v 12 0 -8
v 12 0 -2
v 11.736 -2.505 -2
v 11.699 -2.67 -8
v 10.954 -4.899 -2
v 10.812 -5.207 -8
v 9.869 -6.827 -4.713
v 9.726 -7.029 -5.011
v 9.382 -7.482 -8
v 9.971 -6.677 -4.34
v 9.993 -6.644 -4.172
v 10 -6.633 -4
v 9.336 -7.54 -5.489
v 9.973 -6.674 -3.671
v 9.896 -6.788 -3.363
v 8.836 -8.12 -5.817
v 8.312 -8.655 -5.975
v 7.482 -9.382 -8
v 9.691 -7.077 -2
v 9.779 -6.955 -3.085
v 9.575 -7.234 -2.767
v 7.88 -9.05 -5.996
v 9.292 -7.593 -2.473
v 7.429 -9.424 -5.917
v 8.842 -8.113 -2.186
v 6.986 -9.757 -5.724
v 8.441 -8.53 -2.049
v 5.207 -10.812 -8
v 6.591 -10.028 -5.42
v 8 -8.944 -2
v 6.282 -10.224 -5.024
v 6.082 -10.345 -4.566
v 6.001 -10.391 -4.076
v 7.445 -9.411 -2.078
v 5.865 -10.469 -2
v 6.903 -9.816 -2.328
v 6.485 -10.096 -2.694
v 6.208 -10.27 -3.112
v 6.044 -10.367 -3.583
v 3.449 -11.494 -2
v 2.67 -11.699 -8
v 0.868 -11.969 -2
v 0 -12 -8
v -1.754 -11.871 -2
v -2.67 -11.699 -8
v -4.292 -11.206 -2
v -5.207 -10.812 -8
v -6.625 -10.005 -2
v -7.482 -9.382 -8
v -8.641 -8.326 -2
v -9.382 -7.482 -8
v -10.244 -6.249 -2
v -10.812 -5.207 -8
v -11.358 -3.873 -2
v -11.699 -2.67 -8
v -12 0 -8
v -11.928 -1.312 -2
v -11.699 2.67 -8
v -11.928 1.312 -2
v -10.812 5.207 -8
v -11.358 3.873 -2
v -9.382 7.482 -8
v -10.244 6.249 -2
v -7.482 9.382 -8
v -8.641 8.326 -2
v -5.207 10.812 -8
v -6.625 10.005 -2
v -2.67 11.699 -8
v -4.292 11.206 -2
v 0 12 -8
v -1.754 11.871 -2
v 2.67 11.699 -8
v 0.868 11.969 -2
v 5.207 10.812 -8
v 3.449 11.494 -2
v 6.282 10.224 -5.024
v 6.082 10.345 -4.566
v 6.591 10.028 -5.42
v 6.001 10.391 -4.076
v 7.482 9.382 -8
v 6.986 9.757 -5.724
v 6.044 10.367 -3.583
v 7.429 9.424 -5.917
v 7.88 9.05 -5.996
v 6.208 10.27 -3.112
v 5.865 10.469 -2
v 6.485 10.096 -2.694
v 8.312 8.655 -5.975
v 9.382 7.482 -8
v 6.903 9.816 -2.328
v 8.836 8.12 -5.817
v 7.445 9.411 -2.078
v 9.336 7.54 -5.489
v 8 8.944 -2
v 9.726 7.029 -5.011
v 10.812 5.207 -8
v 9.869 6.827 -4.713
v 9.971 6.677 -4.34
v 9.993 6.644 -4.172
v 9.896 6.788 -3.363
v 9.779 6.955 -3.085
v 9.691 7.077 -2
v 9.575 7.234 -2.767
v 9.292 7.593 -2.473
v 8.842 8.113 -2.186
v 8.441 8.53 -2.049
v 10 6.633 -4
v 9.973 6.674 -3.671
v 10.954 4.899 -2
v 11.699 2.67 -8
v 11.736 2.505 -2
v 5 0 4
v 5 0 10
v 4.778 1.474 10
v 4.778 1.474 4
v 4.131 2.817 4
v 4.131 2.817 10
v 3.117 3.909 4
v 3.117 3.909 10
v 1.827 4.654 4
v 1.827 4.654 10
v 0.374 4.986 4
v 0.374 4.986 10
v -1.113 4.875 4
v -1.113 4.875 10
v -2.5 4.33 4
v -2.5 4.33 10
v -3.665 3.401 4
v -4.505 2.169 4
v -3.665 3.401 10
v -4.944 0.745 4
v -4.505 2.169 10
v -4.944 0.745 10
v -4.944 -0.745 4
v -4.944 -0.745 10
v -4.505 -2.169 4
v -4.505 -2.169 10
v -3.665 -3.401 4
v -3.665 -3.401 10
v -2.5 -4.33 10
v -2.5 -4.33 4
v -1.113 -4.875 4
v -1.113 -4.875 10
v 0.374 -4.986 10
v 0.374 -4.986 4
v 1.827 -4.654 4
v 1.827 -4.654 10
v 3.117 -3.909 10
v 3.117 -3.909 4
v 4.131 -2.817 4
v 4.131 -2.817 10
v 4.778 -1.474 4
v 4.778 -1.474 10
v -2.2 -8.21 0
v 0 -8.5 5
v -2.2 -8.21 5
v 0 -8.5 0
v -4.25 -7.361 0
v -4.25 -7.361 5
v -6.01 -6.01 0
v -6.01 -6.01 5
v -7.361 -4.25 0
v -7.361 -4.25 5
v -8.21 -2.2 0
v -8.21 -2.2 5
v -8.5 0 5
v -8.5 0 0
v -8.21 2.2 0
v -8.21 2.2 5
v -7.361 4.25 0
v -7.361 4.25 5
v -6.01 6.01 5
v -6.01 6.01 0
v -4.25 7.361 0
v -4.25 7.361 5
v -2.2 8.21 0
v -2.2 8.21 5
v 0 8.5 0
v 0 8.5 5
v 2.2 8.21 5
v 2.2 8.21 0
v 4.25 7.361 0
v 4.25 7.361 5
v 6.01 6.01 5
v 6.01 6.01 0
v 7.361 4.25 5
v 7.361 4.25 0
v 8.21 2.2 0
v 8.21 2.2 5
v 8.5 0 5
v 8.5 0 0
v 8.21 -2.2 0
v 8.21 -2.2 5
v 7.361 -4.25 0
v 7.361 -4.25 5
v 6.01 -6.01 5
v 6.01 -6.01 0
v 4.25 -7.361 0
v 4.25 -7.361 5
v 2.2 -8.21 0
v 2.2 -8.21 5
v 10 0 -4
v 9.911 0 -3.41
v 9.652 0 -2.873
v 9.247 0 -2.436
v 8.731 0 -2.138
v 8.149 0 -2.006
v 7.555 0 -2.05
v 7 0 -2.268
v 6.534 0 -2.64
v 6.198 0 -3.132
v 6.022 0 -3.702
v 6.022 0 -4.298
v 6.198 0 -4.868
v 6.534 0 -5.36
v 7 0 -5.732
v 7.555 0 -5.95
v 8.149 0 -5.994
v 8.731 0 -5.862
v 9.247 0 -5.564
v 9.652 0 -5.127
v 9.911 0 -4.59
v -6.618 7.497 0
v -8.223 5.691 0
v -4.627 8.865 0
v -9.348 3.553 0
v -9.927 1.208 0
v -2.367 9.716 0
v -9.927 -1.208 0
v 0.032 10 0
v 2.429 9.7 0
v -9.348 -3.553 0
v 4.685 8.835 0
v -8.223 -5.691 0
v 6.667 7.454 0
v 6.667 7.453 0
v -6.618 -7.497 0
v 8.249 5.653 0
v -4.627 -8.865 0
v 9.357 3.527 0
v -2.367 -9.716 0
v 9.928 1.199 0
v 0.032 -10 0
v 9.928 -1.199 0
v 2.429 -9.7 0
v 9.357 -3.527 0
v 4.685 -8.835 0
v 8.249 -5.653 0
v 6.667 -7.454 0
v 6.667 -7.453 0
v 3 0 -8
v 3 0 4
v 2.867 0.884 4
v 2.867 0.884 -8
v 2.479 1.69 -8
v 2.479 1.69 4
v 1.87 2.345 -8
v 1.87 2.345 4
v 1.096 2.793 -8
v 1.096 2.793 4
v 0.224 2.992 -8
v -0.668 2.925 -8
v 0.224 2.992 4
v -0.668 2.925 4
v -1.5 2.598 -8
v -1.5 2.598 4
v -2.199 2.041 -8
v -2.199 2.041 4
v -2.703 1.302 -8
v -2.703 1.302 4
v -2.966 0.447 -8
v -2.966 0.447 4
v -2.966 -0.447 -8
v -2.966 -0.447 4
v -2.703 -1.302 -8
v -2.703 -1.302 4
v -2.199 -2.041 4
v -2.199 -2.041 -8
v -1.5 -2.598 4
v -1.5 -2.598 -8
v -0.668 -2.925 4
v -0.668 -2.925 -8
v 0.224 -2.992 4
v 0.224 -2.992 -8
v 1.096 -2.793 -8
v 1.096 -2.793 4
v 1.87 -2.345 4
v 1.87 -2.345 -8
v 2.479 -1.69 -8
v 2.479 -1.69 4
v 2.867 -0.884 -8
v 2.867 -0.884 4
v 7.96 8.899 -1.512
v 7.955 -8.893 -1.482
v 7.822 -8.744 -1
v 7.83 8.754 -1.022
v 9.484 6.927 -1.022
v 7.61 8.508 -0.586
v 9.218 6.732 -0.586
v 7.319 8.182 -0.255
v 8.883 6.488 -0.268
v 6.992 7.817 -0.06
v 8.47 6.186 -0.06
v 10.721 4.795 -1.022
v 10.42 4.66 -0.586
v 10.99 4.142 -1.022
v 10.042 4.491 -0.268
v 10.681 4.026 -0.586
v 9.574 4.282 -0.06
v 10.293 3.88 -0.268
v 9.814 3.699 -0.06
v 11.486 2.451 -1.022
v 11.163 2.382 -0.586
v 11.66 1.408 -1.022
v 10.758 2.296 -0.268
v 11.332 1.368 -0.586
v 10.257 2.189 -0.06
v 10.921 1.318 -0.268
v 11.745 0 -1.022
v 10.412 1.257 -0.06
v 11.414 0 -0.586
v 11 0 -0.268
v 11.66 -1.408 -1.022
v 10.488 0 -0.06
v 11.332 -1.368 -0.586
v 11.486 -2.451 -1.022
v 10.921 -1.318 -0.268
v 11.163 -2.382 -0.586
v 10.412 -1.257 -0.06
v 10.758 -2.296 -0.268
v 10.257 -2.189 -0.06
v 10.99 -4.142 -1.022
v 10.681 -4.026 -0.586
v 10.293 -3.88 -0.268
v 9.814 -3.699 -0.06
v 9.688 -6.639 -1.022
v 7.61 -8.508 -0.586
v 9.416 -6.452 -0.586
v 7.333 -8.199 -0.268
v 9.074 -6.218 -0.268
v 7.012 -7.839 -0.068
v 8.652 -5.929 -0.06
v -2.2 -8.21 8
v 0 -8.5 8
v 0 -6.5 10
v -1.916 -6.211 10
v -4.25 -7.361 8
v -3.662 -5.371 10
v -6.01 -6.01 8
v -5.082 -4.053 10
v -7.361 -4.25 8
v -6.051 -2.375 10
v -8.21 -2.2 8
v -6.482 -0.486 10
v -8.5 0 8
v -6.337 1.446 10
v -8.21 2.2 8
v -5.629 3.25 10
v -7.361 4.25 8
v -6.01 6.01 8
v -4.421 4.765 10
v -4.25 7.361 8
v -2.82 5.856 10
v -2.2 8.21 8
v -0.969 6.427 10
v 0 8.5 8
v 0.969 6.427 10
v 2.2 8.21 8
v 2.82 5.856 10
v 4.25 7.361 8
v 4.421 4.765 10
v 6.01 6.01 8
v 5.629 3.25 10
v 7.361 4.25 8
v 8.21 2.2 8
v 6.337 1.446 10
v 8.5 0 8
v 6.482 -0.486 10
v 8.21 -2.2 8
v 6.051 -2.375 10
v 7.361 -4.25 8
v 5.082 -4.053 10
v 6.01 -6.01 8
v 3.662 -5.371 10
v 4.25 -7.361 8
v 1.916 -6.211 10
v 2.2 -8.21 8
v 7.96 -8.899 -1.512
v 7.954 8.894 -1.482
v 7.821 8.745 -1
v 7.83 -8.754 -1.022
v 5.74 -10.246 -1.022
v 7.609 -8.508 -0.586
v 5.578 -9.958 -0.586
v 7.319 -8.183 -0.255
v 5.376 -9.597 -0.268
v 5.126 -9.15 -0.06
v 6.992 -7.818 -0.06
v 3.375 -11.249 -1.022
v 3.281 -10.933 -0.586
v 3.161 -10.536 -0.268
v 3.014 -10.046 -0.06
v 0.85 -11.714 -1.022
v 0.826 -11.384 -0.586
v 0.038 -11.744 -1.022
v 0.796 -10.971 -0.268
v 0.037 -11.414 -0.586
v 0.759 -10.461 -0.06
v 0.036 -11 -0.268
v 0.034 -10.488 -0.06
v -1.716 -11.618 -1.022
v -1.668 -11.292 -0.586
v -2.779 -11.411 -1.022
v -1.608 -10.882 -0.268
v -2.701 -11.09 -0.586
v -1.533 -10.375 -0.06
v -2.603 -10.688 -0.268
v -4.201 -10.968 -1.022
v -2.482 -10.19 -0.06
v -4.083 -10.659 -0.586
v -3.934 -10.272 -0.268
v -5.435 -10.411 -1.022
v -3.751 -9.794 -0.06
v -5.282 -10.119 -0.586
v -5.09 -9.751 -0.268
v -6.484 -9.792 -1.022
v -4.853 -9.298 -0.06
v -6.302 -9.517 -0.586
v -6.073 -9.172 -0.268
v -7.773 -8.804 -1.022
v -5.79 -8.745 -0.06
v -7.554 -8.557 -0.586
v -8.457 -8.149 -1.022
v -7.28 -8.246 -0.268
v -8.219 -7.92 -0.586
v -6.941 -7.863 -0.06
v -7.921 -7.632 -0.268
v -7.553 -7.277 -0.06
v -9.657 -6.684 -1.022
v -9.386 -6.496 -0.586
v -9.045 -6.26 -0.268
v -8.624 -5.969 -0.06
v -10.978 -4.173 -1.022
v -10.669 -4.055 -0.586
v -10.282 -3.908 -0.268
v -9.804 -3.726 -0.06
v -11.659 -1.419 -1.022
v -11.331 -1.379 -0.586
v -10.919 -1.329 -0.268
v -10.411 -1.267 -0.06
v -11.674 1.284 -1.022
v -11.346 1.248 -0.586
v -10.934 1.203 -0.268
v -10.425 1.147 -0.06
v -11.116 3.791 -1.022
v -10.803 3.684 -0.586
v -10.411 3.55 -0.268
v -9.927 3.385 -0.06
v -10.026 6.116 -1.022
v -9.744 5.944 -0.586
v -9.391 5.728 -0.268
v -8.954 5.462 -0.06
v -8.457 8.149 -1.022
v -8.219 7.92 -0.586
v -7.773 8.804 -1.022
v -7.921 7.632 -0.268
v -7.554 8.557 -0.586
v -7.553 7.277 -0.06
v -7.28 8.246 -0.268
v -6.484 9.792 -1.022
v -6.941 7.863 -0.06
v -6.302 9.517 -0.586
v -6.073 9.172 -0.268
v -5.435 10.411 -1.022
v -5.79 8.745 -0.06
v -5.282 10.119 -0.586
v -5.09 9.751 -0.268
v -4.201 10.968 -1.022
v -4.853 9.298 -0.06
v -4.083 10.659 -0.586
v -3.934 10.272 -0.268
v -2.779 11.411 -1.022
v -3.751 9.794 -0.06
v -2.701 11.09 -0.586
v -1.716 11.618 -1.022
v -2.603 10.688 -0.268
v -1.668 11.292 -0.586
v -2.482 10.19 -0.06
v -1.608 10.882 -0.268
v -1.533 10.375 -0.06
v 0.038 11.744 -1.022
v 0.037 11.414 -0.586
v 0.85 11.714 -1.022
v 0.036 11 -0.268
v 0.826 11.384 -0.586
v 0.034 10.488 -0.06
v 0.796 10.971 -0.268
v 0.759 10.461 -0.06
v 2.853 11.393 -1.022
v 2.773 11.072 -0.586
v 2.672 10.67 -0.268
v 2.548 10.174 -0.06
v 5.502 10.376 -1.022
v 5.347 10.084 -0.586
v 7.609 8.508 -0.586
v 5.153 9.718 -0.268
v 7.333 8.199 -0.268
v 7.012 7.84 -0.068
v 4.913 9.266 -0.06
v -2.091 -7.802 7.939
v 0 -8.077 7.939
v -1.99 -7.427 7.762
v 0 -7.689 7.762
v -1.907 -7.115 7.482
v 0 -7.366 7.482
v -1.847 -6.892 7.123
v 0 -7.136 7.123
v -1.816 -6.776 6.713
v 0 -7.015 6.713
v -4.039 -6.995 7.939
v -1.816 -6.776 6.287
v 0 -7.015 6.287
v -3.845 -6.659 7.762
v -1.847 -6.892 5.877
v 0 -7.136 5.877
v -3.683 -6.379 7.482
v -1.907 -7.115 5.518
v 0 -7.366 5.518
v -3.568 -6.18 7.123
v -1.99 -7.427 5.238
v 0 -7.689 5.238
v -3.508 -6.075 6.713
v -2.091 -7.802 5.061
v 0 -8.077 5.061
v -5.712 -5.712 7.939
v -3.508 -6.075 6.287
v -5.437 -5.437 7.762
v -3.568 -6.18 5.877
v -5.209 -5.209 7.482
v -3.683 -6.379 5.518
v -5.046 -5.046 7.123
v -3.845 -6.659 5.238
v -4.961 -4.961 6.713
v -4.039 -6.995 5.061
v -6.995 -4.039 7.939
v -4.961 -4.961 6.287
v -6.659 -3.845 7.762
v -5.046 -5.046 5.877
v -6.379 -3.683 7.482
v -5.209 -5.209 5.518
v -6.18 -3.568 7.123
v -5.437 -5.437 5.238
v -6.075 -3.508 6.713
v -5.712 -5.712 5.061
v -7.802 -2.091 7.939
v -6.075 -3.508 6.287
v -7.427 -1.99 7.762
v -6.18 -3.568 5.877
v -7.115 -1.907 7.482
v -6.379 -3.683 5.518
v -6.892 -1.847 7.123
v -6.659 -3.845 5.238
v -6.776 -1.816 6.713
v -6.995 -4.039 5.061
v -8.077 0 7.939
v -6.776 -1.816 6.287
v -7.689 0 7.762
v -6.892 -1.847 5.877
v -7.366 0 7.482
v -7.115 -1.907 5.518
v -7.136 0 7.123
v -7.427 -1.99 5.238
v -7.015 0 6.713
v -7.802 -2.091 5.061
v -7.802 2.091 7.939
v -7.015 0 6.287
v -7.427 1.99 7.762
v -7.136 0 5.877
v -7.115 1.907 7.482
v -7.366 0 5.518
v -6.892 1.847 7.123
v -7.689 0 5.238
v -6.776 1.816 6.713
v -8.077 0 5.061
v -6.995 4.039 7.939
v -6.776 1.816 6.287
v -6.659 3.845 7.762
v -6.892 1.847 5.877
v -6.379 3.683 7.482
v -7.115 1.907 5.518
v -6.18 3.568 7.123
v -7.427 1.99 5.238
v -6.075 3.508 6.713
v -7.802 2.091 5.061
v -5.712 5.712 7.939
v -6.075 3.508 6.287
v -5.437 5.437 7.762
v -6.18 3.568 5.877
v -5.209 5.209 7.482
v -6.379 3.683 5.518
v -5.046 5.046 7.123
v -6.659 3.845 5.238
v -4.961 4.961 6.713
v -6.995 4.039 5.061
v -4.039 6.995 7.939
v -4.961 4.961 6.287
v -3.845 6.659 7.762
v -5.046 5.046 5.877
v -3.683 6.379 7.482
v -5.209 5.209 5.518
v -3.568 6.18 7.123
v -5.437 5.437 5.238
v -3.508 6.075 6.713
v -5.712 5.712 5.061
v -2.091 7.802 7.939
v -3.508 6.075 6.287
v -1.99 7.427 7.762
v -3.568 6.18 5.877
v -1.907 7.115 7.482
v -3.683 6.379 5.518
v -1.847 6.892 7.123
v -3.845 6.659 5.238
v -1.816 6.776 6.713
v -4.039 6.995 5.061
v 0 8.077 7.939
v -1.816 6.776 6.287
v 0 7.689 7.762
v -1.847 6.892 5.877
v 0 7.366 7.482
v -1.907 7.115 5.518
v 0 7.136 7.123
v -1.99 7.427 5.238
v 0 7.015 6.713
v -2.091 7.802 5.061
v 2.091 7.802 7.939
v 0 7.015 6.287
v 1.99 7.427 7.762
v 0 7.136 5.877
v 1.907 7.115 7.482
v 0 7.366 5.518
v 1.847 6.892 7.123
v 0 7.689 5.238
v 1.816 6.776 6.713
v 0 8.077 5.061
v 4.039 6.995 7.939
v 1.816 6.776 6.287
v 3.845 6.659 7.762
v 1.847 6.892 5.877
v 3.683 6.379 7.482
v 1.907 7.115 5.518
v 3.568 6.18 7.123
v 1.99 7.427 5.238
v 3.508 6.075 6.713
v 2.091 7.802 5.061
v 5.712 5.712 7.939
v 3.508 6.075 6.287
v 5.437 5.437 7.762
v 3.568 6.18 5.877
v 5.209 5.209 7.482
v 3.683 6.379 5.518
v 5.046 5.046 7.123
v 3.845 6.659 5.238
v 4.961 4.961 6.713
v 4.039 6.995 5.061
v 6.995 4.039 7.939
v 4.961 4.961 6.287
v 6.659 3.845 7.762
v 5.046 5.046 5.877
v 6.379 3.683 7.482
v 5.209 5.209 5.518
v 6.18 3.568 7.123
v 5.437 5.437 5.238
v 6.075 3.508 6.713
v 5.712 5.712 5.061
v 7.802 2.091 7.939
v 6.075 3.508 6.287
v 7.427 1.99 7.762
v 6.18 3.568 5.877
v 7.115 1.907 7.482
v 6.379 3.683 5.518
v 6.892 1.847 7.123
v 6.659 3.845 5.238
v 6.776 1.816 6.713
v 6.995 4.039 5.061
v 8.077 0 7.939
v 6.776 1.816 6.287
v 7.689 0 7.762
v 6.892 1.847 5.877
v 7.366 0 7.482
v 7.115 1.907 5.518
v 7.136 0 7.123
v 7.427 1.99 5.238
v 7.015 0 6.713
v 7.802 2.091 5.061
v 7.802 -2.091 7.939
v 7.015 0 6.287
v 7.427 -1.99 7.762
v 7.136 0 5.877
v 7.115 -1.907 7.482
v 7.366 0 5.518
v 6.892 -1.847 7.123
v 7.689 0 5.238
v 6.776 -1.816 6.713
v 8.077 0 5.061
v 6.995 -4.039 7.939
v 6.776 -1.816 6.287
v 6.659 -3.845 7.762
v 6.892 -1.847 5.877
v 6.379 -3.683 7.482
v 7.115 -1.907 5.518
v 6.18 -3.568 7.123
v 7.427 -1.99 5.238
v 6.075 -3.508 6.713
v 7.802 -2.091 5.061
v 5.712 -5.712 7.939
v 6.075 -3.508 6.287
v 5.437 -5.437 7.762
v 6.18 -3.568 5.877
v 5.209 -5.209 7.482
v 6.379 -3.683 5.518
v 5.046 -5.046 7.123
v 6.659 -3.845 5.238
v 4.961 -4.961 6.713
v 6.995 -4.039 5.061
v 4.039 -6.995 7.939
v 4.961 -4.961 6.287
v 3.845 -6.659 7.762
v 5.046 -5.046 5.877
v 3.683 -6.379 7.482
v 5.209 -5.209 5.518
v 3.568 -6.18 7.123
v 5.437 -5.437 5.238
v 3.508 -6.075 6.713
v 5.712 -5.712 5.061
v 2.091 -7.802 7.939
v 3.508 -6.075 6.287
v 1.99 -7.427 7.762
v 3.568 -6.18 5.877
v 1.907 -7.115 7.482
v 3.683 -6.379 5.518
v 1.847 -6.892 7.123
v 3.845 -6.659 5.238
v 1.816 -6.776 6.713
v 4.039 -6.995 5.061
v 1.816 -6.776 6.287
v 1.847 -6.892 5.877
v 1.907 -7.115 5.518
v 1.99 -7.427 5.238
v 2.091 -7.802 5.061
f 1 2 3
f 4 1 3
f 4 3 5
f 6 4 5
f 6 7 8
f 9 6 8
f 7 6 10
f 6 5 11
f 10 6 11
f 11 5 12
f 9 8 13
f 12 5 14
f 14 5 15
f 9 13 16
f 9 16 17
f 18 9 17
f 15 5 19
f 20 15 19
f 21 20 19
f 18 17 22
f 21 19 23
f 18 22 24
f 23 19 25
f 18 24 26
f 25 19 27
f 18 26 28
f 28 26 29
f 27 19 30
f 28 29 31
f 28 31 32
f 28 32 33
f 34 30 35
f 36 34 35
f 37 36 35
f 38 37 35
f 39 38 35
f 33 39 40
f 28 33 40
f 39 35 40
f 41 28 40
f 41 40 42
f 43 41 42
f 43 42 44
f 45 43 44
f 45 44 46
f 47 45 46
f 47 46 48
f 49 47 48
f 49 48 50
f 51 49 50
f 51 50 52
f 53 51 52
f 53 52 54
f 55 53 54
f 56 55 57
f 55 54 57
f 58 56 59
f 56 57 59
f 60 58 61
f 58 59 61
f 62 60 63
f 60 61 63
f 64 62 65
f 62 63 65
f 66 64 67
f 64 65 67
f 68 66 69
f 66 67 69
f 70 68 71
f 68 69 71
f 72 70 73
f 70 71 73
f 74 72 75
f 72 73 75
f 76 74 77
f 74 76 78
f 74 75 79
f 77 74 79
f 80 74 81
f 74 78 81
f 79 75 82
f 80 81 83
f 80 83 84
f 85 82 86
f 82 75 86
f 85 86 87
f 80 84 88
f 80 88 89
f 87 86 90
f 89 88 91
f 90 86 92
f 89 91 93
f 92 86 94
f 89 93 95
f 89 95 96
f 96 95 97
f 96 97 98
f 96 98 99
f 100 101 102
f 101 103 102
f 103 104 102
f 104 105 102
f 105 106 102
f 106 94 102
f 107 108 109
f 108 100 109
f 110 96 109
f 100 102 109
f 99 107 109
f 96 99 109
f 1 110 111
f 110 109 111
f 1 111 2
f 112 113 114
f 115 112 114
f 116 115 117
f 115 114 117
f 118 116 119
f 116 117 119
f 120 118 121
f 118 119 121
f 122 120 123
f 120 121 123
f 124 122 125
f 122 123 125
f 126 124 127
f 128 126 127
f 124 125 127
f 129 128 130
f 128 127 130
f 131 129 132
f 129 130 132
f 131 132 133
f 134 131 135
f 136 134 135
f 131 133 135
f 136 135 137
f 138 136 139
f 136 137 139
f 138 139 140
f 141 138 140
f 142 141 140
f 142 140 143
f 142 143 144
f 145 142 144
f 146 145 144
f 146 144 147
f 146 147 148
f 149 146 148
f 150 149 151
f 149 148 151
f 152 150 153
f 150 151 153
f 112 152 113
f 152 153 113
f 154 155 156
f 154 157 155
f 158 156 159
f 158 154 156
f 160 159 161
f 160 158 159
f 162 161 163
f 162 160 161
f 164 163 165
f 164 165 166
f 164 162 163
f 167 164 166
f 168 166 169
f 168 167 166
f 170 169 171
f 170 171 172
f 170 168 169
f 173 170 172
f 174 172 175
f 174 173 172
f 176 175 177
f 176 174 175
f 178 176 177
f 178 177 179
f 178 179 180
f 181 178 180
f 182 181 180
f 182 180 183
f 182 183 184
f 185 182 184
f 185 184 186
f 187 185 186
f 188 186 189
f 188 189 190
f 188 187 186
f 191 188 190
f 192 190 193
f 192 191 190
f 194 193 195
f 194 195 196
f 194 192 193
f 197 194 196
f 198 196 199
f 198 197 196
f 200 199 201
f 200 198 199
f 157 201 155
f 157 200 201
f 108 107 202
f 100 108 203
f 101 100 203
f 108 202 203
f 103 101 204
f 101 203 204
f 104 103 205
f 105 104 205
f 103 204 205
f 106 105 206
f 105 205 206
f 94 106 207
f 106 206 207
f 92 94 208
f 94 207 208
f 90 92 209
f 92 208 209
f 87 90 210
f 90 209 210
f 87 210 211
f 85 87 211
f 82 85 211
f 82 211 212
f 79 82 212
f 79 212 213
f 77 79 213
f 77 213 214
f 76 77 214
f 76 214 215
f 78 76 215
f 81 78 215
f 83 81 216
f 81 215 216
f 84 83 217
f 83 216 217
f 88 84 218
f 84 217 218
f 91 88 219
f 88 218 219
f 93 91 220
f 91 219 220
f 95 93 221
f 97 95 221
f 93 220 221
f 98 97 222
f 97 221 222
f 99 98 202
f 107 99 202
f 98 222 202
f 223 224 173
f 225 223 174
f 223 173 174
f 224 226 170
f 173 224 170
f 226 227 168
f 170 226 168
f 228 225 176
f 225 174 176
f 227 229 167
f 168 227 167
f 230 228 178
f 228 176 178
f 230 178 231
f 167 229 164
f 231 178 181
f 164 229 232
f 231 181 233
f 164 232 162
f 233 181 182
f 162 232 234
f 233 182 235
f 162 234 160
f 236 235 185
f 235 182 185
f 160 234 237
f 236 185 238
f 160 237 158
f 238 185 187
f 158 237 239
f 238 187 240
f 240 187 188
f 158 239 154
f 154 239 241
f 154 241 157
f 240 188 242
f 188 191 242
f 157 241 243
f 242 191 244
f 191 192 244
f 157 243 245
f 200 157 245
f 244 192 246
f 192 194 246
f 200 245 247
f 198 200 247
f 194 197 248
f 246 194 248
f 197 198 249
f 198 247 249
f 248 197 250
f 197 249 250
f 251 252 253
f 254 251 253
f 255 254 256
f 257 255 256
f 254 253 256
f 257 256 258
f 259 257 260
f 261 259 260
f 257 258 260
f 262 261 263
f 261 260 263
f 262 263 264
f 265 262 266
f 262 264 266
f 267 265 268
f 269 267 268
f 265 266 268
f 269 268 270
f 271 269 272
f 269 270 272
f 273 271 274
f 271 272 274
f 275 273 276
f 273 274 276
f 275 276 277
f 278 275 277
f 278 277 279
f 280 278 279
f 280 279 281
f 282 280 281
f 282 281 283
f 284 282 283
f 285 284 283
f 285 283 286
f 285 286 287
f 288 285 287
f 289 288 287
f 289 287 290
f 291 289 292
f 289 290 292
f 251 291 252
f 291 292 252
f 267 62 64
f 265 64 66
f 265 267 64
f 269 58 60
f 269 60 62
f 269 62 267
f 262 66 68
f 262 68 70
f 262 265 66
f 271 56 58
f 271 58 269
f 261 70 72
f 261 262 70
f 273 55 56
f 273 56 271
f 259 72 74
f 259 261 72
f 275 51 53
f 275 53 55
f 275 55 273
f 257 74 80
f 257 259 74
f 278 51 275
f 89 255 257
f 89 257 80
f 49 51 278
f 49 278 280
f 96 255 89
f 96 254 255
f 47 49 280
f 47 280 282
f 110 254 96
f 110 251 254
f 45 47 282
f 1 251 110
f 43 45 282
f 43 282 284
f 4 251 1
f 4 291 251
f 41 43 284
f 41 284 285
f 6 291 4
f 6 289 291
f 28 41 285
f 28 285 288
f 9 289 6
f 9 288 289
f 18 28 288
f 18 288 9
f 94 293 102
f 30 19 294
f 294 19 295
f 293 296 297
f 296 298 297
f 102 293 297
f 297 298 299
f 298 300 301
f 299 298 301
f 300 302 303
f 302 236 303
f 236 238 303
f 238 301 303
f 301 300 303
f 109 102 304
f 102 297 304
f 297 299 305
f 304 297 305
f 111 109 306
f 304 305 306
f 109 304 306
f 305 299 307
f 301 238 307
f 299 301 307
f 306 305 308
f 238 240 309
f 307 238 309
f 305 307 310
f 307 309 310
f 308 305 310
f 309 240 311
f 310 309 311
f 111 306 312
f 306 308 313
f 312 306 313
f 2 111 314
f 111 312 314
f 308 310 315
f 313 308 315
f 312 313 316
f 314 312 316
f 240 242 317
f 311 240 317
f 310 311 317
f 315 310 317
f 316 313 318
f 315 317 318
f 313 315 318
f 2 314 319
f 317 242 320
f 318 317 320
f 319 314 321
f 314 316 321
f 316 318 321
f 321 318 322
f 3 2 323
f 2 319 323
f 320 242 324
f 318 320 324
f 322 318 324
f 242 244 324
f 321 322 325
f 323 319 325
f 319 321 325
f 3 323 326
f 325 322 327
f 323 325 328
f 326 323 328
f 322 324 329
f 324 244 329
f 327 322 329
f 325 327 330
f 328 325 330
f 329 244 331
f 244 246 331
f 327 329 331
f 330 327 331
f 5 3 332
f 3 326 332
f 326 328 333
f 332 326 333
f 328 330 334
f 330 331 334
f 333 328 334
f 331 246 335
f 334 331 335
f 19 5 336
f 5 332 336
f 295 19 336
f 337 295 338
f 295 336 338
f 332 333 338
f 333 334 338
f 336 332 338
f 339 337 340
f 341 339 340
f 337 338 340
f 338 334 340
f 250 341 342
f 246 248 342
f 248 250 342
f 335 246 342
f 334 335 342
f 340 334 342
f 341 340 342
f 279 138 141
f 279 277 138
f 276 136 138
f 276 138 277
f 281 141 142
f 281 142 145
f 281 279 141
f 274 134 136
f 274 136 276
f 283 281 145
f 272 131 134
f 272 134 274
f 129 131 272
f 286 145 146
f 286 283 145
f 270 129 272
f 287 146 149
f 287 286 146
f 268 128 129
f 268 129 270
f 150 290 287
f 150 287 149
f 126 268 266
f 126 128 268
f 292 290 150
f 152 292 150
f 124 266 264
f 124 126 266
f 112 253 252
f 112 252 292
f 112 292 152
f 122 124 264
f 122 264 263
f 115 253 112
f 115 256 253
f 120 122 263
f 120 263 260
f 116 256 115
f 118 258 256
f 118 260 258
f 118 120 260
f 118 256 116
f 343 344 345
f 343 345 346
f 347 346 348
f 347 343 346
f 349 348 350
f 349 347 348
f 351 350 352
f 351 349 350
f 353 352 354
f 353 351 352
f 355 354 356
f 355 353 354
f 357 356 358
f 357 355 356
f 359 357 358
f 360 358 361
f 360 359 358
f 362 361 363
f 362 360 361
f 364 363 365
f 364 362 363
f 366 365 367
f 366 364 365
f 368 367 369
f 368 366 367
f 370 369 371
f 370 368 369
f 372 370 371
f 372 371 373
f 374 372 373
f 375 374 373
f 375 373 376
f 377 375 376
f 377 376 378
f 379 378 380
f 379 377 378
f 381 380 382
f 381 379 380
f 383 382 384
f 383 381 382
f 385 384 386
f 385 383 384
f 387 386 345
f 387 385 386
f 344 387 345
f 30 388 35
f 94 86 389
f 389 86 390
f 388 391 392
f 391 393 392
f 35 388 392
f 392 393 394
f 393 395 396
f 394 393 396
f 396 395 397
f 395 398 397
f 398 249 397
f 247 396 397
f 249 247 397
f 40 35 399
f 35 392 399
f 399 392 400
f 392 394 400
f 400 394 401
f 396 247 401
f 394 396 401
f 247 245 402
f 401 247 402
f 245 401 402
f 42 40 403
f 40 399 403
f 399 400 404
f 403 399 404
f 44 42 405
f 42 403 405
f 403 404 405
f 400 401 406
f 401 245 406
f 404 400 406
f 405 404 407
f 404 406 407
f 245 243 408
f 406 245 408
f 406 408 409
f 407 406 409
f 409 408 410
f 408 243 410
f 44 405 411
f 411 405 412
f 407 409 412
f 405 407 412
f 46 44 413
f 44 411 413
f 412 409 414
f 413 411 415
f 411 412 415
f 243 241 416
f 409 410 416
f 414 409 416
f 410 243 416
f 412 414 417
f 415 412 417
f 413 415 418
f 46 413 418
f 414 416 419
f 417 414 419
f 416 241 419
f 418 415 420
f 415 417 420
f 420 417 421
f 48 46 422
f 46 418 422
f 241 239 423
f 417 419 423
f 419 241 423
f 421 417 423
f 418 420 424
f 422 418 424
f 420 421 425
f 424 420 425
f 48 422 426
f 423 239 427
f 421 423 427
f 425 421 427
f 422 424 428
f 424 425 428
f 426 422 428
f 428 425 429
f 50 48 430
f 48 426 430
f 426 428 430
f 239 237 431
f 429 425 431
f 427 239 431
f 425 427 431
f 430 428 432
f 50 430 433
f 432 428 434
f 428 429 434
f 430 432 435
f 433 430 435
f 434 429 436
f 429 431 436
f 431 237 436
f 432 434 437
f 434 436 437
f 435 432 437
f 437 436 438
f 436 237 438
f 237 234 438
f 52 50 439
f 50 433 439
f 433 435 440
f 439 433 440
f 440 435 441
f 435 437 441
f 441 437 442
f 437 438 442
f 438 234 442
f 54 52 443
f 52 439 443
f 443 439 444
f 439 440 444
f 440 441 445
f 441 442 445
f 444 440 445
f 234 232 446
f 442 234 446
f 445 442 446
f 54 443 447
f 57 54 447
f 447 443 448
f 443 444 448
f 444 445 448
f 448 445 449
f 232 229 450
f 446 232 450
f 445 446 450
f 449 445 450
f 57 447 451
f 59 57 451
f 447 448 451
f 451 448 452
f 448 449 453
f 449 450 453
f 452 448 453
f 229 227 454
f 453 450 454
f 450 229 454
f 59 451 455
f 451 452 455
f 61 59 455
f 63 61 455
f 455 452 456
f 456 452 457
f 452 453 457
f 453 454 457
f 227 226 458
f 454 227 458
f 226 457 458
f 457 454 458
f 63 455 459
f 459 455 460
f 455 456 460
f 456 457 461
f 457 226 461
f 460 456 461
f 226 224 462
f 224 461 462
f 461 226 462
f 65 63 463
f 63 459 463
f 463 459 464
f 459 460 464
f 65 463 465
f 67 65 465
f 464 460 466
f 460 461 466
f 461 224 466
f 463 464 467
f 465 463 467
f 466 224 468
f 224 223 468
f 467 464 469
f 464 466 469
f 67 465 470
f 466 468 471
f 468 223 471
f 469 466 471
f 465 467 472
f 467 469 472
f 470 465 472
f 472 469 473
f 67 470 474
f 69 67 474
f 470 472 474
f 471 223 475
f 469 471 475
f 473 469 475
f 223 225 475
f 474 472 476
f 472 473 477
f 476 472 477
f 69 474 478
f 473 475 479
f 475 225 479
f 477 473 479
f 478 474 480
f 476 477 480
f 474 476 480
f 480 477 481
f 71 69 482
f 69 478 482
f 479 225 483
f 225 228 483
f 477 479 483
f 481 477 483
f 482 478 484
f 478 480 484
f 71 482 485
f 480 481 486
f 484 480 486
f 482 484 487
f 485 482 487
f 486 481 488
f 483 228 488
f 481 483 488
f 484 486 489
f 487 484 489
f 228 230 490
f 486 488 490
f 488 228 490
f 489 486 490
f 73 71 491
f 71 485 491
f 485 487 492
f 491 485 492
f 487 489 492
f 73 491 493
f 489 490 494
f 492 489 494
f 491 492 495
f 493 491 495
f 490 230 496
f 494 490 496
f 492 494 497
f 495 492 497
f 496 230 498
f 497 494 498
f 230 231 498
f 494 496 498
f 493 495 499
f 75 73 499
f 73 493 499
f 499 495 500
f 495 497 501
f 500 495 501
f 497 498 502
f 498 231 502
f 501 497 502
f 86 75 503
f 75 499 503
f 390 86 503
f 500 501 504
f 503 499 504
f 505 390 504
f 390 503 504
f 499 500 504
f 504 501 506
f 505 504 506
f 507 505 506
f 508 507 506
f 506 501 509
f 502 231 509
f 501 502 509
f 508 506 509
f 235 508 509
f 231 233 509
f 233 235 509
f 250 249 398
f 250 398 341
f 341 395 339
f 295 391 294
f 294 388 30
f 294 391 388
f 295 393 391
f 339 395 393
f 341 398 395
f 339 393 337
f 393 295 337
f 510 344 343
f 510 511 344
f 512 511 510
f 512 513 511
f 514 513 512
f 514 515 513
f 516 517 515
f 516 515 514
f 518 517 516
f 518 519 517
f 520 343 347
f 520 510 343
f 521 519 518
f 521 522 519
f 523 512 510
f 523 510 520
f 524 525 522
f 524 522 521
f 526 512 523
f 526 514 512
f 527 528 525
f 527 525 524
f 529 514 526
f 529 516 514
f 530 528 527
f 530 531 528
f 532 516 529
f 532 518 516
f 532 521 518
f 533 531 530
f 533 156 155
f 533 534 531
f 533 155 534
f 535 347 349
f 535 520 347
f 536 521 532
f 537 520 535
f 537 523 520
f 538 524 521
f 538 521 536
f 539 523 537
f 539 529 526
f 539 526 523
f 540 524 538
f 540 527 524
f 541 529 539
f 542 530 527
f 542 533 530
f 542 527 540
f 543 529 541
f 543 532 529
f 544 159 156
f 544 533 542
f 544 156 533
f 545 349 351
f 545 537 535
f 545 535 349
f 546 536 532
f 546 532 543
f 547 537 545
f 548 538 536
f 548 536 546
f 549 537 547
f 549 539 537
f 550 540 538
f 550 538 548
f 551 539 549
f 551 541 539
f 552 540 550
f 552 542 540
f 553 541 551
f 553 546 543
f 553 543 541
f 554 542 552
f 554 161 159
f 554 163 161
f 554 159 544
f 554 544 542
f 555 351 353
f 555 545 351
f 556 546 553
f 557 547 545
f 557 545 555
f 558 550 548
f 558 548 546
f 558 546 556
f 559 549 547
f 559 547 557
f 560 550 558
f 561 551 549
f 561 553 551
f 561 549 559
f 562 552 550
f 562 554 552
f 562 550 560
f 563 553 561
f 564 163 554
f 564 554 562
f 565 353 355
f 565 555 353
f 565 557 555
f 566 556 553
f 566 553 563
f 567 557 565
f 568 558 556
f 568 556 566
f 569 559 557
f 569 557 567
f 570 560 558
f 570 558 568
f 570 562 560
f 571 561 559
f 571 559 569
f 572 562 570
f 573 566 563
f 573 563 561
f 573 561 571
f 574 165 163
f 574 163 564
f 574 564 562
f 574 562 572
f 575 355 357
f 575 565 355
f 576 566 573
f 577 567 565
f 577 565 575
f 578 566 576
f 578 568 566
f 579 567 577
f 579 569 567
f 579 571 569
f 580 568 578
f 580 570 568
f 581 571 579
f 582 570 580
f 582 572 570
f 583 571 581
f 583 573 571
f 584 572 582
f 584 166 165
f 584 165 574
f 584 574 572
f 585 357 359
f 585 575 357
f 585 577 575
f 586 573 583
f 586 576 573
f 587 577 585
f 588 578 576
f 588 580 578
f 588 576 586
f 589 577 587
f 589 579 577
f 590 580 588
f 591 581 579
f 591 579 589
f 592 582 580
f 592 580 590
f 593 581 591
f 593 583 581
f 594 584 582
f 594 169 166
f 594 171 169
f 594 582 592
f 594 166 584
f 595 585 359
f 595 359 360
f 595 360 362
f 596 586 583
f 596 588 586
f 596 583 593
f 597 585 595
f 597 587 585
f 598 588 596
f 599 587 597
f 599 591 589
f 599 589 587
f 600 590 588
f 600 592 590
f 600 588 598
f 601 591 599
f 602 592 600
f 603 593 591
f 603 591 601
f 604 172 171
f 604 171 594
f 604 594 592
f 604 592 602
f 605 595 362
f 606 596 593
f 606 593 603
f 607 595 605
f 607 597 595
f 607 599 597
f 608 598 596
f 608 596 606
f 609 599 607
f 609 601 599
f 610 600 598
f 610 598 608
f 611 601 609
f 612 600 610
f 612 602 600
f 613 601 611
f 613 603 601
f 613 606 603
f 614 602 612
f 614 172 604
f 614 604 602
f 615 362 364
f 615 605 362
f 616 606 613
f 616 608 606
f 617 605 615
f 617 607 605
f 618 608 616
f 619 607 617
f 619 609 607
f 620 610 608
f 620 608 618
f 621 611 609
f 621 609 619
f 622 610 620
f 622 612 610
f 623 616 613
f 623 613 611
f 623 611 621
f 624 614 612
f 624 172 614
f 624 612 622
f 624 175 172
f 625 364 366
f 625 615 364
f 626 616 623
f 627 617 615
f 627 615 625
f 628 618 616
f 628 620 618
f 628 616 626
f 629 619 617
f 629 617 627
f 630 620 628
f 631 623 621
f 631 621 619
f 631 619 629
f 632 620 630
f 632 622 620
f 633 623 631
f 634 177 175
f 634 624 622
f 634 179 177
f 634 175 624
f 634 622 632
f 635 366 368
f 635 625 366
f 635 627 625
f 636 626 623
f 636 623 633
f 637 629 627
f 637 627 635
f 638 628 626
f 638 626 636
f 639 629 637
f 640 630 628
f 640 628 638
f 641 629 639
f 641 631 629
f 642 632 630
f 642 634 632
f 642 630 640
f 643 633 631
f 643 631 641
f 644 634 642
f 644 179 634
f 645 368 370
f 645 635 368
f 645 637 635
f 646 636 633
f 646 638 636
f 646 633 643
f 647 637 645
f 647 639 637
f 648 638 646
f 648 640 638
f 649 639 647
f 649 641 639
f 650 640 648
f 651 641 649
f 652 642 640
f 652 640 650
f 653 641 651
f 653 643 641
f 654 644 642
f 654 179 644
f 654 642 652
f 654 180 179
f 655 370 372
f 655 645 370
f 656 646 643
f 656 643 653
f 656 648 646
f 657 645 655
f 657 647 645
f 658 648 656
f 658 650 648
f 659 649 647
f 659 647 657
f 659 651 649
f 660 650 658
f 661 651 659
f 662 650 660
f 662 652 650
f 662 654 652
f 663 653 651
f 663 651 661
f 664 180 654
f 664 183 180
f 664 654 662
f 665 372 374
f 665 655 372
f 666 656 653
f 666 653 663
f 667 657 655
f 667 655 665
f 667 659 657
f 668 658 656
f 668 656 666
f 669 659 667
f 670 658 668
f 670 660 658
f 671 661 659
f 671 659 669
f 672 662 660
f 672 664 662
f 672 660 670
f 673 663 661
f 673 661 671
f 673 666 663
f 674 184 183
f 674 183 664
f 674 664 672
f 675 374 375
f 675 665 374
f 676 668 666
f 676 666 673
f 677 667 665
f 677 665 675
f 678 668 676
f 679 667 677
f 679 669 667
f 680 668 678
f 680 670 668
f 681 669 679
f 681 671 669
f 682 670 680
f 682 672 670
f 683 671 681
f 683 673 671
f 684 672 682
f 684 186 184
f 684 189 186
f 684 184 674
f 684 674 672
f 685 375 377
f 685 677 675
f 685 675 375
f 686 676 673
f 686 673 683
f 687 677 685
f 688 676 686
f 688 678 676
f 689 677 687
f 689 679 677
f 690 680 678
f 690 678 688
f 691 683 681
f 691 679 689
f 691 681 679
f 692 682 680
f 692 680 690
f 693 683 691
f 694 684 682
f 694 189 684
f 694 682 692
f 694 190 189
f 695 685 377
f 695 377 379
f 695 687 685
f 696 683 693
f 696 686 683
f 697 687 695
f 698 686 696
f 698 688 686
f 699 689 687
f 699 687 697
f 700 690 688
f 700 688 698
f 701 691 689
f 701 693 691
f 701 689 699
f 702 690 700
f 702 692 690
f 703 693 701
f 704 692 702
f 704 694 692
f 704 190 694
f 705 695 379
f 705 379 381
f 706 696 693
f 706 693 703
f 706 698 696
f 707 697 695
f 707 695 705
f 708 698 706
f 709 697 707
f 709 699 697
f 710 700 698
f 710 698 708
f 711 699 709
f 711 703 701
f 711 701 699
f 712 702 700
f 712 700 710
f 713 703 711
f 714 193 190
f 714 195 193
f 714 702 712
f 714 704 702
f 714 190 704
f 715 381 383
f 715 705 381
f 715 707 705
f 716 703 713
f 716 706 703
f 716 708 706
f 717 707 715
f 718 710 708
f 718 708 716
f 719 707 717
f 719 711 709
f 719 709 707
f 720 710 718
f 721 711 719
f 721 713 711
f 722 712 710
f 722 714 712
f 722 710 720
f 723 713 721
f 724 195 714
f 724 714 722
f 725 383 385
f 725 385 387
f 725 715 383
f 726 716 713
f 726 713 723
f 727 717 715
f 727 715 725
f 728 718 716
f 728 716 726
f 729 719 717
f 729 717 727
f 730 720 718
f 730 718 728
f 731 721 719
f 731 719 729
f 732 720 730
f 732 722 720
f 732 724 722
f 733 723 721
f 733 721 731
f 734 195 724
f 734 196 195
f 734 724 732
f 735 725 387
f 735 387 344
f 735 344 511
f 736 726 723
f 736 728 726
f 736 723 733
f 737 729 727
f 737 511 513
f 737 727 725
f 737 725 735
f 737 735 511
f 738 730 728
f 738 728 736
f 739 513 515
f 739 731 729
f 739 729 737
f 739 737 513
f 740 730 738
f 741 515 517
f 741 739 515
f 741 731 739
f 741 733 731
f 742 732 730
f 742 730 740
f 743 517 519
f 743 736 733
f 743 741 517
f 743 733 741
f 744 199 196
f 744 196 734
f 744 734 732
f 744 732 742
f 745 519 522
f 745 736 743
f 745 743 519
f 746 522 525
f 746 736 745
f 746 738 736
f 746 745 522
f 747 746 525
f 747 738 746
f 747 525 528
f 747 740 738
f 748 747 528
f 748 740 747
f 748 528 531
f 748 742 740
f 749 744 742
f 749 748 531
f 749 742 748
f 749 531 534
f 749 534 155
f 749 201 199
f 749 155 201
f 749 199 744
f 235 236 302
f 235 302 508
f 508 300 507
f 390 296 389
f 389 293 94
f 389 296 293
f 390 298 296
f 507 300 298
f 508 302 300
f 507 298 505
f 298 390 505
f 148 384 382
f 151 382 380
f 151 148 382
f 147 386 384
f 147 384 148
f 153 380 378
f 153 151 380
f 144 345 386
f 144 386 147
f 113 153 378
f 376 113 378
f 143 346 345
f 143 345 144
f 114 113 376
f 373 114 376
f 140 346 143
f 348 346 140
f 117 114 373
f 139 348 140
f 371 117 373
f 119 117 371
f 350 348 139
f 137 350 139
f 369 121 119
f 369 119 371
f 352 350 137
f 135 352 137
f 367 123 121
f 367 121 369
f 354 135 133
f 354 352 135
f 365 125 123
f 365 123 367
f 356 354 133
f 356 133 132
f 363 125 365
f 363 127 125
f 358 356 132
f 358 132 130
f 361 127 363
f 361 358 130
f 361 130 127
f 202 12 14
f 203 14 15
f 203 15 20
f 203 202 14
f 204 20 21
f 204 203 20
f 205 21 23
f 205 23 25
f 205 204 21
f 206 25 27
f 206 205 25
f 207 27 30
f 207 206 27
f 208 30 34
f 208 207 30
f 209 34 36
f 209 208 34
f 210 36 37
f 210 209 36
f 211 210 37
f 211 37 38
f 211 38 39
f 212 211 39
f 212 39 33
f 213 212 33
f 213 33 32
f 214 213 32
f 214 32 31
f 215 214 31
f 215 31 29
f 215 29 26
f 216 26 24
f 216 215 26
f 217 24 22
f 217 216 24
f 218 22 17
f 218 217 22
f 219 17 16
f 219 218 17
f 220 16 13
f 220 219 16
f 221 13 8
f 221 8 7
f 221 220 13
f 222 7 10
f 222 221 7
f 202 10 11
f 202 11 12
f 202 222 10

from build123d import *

# Parameters (mm, degrees)
F2_SIZE        = 1.99999
F3_R           = 5
F4_DEPTH       = 6
F5_R           = 12
F6_DEPTH       = 8
F7_R           = 3
F8_DEPTH       = 12
F9_R           = 2
F10_DEPTH      = 12.001
F10_DEPTH_BACK = 12.001
F11_R          = 2


# Not quite as in the source:
# - a fillet or chamfer is up to 0.001 mm smaller than in the source, because OpenCascade refuses the exact size


with BuildPart() as f1:
    # F0 (on Right) → F1 (revolve)
    with BuildSketch(Plane.YZ):
        with BuildLine():
            Line((-8.5, 0), (0, 0))
            Line((0, 0), (0, 10))
            Line((0, 10), (-8.5, 10))
            Line((-8.5, 10), (-8.5, 8))
            ThreePointArc((-8.5, 8), (-7, 6.5), (-8.5, 5))
            Line((-8.5, 5), (-8.5, 0))
        make_face()
    revolve(axis=Axis((0, 0, 5), (0, 0, -1)))

    # F2 (size 2 in the source; OpenCascade refuses exactly that, so slightly less here)
    f2_edges = [f1.edges().sort_by_distance(p)[0] for p in [
        (0, 8.5, 10),
    ]]
    chamfer(f2_edges, length=F2_SIZE)

    # F3 (on face) → F4 (cut)
    with BuildSketch(Plane.XY.offset(10)):
        Circle(F3_R)
    extrude(amount=-F4_DEPTH, mode=Mode.SUBTRACT)

    # F5 (on face) → F6 (join)
    with BuildSketch(Plane(origin=(0, 0, 0), x_dir=(1, 0, 0), z_dir=(0, 0, -1))):
        Circle(F5_R)
    extrude(amount=F6_DEPTH)

    # F7 (on face) → F8 (cut, through all)
    with BuildSketch(Plane.XY.offset(4)):
        Circle(F7_R)
    extrude(amount=-F8_DEPTH, mode=Mode.SUBTRACT)

    # F9 (on Front) → F10 (cut, two sides)
    with BuildSketch(Plane.XZ) as f10_sk:
        with Locations((8, -4)):
            Circle(F9_R)
    extrude(amount=-F10_DEPTH, mode=Mode.SUBTRACT)
    extrude(f10_sk.sketch, amount=F10_DEPTH_BACK, mode=Mode.SUBTRACT)

    # F11
    f11_edges = [f1.edges().sort_by_distance(p)[0] for p in [
        (-12, 0, 0),
    ]]
    fillet(f11_edges, radius=F11_R)


solid = f1.part
